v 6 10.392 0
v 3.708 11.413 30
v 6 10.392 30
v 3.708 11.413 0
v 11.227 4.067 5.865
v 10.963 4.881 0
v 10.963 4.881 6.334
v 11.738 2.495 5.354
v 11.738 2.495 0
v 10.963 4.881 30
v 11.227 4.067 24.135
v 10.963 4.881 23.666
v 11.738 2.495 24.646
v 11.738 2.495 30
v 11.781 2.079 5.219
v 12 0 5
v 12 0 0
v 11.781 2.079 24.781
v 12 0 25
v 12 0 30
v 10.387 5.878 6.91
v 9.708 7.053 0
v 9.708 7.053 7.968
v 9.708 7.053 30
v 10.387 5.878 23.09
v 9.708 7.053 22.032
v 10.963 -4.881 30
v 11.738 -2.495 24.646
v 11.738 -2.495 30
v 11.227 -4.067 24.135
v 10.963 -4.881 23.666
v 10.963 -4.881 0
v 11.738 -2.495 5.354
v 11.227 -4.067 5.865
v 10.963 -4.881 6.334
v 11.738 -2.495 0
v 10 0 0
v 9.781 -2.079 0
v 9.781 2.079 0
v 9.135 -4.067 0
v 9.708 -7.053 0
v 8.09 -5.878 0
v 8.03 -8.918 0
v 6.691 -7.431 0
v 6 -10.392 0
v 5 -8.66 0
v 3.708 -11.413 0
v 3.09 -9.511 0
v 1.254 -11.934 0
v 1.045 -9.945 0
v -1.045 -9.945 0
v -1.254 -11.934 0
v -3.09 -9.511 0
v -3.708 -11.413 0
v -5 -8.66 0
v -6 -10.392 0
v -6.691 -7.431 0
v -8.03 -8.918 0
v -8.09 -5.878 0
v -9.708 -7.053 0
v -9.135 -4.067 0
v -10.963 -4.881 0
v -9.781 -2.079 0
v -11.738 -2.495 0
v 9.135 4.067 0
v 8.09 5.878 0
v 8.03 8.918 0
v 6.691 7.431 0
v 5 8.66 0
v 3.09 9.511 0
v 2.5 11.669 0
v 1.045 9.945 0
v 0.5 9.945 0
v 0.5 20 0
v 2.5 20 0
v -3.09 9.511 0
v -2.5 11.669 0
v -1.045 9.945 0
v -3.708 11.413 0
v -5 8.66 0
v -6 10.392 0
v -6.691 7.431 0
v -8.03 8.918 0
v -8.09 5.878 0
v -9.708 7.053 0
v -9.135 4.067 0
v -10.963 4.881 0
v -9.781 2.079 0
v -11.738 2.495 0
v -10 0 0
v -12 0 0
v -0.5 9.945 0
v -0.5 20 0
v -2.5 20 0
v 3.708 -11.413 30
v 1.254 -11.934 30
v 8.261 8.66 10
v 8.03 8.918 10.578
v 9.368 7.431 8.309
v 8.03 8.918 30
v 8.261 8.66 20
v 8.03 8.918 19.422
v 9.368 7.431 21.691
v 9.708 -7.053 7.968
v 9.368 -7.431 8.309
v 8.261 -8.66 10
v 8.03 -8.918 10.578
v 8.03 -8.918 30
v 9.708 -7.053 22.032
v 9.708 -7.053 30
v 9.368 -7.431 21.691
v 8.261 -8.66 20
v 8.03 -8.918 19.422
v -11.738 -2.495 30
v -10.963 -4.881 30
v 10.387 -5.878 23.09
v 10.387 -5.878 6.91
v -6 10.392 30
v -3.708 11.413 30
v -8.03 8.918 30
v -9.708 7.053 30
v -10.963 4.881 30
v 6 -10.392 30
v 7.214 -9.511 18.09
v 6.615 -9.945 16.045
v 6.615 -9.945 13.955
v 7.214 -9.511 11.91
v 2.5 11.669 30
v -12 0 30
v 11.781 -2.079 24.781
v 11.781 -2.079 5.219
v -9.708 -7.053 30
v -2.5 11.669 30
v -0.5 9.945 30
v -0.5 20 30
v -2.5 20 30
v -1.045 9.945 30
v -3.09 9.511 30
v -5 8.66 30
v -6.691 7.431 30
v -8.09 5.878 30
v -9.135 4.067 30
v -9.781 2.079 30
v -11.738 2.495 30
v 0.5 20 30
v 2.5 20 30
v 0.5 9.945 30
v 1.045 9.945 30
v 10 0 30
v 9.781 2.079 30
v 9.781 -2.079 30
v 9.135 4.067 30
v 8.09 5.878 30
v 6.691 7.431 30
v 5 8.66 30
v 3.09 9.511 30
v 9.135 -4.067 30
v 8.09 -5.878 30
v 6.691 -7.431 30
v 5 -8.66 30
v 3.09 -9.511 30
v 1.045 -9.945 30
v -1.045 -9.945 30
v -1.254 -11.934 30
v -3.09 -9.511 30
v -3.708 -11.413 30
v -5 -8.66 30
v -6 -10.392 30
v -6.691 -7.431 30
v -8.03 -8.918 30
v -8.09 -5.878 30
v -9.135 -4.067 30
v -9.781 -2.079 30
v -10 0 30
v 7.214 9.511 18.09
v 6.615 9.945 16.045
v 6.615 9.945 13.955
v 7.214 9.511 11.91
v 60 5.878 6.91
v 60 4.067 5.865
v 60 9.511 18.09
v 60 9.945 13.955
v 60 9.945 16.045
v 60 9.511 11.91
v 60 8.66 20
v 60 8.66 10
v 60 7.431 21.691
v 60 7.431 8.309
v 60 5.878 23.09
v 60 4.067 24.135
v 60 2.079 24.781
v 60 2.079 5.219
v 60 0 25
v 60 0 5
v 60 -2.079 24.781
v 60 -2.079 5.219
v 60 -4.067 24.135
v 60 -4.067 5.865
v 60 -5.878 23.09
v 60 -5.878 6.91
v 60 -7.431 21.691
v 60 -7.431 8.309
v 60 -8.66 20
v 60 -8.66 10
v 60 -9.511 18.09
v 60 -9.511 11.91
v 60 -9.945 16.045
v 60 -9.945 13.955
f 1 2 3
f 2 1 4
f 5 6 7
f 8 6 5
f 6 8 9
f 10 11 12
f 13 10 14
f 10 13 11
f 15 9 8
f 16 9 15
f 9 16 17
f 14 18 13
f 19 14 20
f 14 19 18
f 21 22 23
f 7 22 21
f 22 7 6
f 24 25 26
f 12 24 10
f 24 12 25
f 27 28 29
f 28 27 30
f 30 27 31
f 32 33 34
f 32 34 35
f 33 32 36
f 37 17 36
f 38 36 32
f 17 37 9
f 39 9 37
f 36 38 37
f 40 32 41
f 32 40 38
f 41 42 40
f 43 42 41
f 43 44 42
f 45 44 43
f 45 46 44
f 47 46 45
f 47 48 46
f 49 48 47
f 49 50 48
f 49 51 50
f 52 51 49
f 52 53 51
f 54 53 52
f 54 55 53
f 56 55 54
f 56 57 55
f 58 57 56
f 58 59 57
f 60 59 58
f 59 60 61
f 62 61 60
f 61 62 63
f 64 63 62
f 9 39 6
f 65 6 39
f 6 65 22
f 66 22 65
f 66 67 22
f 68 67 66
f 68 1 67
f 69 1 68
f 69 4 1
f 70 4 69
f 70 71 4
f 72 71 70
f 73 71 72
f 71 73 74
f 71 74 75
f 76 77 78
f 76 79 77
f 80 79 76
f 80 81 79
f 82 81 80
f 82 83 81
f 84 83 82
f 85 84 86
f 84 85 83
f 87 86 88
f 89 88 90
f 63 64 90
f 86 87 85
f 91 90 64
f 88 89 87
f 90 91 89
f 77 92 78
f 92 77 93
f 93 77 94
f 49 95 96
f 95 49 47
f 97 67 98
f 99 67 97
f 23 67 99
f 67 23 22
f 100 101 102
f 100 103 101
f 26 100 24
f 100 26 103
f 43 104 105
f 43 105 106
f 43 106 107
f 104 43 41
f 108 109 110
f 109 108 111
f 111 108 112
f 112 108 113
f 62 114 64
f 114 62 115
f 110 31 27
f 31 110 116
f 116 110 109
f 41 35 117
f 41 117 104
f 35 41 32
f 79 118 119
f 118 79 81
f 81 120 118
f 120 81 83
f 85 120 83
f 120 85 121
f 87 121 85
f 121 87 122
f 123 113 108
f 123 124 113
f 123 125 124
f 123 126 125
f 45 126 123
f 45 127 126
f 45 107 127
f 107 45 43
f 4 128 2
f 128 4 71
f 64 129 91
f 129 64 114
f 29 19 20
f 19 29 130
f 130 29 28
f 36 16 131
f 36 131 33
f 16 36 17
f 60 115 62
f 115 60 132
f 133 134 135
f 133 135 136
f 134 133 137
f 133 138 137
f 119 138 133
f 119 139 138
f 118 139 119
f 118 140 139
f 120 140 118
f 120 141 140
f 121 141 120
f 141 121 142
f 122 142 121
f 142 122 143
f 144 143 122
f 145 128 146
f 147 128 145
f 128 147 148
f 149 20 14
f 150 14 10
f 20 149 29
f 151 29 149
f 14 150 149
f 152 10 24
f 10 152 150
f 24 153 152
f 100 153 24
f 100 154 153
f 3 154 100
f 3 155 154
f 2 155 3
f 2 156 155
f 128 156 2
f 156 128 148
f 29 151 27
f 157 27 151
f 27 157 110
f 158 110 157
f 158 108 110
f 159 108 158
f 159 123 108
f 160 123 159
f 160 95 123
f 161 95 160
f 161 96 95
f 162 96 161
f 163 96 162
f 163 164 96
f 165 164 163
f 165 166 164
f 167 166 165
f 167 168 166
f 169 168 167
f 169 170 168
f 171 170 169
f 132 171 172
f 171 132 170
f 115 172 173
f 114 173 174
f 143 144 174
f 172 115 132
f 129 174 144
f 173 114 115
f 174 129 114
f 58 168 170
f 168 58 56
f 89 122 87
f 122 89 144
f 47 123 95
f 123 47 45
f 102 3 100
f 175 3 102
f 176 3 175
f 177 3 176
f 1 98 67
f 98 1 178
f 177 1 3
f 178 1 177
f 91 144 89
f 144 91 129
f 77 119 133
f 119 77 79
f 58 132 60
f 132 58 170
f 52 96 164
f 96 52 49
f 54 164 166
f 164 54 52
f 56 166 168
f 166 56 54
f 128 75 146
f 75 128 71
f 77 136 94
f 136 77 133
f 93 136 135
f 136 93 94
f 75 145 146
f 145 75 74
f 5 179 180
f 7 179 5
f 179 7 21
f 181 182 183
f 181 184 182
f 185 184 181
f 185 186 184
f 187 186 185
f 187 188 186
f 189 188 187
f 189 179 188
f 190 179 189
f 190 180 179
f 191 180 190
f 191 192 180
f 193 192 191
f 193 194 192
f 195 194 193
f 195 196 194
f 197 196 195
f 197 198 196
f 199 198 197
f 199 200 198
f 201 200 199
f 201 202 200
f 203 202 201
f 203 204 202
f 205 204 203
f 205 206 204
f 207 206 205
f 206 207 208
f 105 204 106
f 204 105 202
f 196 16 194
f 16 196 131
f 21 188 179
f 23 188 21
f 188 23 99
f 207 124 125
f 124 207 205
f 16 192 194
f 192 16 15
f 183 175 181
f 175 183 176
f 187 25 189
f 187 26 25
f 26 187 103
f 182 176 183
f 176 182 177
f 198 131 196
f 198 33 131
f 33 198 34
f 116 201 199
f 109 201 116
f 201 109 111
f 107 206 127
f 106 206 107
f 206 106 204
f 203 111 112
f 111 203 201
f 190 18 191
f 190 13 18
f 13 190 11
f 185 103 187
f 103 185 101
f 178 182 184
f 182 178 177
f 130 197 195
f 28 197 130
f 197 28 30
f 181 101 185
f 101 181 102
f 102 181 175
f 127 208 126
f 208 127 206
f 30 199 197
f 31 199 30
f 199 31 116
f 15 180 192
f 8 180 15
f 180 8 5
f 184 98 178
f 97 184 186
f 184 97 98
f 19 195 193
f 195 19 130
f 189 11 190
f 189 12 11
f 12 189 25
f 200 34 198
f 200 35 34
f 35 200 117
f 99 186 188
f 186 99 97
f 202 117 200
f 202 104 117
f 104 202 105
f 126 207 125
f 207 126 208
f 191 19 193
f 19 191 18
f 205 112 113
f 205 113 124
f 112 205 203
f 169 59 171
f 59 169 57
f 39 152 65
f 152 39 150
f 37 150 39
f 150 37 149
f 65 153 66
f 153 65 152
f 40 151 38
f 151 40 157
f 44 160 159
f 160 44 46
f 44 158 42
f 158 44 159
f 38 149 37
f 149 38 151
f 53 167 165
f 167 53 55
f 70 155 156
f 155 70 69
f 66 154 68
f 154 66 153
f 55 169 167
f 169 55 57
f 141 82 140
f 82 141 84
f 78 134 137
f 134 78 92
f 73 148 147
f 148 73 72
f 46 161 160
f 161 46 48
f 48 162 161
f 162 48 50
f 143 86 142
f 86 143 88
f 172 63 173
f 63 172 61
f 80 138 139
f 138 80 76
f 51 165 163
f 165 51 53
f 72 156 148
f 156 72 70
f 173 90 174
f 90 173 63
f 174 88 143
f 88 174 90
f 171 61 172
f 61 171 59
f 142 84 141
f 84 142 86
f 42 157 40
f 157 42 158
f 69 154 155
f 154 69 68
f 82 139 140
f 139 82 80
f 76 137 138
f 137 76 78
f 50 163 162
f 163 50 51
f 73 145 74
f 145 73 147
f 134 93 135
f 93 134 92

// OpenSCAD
// Bracket to attach to wheelchair strut to mount bike light.

strut_dia = 20;	// mm:  diameter of the strut the bracket clamps to.
hbar_dia = 20;   // mm:  diameter of the stub of 'handle bar' for the light.
hbar_len = 50;   // mm:  the length of the stub of 'handlebar'
bracket_th = 2;	//mm
bracket_h  = 30;	//mm
bracket_w = 10;	//mm
clamp_th = 5;	//mm
cutout_th = 1;	//mm
overlap = 5;	//mm (how much  bigger to make objects than
			//       target object when subtracting.

// First we make the object solid, then subtract the cut-outs at the
// end - makes the code much simpler than doing cut outs as we go.
difference() {
	union() {
		// Wrap around bit
		cylinder(r=strut_dia/2+bracket_th,h=bracket_h);		
		// Clamp
		translate([-0.5*clamp_th,strut_dia/2,0])
			cube([clamp_th,bracket_w,bracket_h]);
		// make the handlebar stub
		translate([0,0,bracket_h/2]) rotate(90,[0,1,0])
			cylinder(r=hbar_dia/2,h=hbar_len+strut_dia/2);
	}
	cylinder(r=strut_dia/2,h=bracket_h);
	// cut out
	translate([-1*cutout_th/2,0,0]) {
		cube([cutout_th,bracket_w+2*overlap,bracket_h+2*overlap]);
	}
}
